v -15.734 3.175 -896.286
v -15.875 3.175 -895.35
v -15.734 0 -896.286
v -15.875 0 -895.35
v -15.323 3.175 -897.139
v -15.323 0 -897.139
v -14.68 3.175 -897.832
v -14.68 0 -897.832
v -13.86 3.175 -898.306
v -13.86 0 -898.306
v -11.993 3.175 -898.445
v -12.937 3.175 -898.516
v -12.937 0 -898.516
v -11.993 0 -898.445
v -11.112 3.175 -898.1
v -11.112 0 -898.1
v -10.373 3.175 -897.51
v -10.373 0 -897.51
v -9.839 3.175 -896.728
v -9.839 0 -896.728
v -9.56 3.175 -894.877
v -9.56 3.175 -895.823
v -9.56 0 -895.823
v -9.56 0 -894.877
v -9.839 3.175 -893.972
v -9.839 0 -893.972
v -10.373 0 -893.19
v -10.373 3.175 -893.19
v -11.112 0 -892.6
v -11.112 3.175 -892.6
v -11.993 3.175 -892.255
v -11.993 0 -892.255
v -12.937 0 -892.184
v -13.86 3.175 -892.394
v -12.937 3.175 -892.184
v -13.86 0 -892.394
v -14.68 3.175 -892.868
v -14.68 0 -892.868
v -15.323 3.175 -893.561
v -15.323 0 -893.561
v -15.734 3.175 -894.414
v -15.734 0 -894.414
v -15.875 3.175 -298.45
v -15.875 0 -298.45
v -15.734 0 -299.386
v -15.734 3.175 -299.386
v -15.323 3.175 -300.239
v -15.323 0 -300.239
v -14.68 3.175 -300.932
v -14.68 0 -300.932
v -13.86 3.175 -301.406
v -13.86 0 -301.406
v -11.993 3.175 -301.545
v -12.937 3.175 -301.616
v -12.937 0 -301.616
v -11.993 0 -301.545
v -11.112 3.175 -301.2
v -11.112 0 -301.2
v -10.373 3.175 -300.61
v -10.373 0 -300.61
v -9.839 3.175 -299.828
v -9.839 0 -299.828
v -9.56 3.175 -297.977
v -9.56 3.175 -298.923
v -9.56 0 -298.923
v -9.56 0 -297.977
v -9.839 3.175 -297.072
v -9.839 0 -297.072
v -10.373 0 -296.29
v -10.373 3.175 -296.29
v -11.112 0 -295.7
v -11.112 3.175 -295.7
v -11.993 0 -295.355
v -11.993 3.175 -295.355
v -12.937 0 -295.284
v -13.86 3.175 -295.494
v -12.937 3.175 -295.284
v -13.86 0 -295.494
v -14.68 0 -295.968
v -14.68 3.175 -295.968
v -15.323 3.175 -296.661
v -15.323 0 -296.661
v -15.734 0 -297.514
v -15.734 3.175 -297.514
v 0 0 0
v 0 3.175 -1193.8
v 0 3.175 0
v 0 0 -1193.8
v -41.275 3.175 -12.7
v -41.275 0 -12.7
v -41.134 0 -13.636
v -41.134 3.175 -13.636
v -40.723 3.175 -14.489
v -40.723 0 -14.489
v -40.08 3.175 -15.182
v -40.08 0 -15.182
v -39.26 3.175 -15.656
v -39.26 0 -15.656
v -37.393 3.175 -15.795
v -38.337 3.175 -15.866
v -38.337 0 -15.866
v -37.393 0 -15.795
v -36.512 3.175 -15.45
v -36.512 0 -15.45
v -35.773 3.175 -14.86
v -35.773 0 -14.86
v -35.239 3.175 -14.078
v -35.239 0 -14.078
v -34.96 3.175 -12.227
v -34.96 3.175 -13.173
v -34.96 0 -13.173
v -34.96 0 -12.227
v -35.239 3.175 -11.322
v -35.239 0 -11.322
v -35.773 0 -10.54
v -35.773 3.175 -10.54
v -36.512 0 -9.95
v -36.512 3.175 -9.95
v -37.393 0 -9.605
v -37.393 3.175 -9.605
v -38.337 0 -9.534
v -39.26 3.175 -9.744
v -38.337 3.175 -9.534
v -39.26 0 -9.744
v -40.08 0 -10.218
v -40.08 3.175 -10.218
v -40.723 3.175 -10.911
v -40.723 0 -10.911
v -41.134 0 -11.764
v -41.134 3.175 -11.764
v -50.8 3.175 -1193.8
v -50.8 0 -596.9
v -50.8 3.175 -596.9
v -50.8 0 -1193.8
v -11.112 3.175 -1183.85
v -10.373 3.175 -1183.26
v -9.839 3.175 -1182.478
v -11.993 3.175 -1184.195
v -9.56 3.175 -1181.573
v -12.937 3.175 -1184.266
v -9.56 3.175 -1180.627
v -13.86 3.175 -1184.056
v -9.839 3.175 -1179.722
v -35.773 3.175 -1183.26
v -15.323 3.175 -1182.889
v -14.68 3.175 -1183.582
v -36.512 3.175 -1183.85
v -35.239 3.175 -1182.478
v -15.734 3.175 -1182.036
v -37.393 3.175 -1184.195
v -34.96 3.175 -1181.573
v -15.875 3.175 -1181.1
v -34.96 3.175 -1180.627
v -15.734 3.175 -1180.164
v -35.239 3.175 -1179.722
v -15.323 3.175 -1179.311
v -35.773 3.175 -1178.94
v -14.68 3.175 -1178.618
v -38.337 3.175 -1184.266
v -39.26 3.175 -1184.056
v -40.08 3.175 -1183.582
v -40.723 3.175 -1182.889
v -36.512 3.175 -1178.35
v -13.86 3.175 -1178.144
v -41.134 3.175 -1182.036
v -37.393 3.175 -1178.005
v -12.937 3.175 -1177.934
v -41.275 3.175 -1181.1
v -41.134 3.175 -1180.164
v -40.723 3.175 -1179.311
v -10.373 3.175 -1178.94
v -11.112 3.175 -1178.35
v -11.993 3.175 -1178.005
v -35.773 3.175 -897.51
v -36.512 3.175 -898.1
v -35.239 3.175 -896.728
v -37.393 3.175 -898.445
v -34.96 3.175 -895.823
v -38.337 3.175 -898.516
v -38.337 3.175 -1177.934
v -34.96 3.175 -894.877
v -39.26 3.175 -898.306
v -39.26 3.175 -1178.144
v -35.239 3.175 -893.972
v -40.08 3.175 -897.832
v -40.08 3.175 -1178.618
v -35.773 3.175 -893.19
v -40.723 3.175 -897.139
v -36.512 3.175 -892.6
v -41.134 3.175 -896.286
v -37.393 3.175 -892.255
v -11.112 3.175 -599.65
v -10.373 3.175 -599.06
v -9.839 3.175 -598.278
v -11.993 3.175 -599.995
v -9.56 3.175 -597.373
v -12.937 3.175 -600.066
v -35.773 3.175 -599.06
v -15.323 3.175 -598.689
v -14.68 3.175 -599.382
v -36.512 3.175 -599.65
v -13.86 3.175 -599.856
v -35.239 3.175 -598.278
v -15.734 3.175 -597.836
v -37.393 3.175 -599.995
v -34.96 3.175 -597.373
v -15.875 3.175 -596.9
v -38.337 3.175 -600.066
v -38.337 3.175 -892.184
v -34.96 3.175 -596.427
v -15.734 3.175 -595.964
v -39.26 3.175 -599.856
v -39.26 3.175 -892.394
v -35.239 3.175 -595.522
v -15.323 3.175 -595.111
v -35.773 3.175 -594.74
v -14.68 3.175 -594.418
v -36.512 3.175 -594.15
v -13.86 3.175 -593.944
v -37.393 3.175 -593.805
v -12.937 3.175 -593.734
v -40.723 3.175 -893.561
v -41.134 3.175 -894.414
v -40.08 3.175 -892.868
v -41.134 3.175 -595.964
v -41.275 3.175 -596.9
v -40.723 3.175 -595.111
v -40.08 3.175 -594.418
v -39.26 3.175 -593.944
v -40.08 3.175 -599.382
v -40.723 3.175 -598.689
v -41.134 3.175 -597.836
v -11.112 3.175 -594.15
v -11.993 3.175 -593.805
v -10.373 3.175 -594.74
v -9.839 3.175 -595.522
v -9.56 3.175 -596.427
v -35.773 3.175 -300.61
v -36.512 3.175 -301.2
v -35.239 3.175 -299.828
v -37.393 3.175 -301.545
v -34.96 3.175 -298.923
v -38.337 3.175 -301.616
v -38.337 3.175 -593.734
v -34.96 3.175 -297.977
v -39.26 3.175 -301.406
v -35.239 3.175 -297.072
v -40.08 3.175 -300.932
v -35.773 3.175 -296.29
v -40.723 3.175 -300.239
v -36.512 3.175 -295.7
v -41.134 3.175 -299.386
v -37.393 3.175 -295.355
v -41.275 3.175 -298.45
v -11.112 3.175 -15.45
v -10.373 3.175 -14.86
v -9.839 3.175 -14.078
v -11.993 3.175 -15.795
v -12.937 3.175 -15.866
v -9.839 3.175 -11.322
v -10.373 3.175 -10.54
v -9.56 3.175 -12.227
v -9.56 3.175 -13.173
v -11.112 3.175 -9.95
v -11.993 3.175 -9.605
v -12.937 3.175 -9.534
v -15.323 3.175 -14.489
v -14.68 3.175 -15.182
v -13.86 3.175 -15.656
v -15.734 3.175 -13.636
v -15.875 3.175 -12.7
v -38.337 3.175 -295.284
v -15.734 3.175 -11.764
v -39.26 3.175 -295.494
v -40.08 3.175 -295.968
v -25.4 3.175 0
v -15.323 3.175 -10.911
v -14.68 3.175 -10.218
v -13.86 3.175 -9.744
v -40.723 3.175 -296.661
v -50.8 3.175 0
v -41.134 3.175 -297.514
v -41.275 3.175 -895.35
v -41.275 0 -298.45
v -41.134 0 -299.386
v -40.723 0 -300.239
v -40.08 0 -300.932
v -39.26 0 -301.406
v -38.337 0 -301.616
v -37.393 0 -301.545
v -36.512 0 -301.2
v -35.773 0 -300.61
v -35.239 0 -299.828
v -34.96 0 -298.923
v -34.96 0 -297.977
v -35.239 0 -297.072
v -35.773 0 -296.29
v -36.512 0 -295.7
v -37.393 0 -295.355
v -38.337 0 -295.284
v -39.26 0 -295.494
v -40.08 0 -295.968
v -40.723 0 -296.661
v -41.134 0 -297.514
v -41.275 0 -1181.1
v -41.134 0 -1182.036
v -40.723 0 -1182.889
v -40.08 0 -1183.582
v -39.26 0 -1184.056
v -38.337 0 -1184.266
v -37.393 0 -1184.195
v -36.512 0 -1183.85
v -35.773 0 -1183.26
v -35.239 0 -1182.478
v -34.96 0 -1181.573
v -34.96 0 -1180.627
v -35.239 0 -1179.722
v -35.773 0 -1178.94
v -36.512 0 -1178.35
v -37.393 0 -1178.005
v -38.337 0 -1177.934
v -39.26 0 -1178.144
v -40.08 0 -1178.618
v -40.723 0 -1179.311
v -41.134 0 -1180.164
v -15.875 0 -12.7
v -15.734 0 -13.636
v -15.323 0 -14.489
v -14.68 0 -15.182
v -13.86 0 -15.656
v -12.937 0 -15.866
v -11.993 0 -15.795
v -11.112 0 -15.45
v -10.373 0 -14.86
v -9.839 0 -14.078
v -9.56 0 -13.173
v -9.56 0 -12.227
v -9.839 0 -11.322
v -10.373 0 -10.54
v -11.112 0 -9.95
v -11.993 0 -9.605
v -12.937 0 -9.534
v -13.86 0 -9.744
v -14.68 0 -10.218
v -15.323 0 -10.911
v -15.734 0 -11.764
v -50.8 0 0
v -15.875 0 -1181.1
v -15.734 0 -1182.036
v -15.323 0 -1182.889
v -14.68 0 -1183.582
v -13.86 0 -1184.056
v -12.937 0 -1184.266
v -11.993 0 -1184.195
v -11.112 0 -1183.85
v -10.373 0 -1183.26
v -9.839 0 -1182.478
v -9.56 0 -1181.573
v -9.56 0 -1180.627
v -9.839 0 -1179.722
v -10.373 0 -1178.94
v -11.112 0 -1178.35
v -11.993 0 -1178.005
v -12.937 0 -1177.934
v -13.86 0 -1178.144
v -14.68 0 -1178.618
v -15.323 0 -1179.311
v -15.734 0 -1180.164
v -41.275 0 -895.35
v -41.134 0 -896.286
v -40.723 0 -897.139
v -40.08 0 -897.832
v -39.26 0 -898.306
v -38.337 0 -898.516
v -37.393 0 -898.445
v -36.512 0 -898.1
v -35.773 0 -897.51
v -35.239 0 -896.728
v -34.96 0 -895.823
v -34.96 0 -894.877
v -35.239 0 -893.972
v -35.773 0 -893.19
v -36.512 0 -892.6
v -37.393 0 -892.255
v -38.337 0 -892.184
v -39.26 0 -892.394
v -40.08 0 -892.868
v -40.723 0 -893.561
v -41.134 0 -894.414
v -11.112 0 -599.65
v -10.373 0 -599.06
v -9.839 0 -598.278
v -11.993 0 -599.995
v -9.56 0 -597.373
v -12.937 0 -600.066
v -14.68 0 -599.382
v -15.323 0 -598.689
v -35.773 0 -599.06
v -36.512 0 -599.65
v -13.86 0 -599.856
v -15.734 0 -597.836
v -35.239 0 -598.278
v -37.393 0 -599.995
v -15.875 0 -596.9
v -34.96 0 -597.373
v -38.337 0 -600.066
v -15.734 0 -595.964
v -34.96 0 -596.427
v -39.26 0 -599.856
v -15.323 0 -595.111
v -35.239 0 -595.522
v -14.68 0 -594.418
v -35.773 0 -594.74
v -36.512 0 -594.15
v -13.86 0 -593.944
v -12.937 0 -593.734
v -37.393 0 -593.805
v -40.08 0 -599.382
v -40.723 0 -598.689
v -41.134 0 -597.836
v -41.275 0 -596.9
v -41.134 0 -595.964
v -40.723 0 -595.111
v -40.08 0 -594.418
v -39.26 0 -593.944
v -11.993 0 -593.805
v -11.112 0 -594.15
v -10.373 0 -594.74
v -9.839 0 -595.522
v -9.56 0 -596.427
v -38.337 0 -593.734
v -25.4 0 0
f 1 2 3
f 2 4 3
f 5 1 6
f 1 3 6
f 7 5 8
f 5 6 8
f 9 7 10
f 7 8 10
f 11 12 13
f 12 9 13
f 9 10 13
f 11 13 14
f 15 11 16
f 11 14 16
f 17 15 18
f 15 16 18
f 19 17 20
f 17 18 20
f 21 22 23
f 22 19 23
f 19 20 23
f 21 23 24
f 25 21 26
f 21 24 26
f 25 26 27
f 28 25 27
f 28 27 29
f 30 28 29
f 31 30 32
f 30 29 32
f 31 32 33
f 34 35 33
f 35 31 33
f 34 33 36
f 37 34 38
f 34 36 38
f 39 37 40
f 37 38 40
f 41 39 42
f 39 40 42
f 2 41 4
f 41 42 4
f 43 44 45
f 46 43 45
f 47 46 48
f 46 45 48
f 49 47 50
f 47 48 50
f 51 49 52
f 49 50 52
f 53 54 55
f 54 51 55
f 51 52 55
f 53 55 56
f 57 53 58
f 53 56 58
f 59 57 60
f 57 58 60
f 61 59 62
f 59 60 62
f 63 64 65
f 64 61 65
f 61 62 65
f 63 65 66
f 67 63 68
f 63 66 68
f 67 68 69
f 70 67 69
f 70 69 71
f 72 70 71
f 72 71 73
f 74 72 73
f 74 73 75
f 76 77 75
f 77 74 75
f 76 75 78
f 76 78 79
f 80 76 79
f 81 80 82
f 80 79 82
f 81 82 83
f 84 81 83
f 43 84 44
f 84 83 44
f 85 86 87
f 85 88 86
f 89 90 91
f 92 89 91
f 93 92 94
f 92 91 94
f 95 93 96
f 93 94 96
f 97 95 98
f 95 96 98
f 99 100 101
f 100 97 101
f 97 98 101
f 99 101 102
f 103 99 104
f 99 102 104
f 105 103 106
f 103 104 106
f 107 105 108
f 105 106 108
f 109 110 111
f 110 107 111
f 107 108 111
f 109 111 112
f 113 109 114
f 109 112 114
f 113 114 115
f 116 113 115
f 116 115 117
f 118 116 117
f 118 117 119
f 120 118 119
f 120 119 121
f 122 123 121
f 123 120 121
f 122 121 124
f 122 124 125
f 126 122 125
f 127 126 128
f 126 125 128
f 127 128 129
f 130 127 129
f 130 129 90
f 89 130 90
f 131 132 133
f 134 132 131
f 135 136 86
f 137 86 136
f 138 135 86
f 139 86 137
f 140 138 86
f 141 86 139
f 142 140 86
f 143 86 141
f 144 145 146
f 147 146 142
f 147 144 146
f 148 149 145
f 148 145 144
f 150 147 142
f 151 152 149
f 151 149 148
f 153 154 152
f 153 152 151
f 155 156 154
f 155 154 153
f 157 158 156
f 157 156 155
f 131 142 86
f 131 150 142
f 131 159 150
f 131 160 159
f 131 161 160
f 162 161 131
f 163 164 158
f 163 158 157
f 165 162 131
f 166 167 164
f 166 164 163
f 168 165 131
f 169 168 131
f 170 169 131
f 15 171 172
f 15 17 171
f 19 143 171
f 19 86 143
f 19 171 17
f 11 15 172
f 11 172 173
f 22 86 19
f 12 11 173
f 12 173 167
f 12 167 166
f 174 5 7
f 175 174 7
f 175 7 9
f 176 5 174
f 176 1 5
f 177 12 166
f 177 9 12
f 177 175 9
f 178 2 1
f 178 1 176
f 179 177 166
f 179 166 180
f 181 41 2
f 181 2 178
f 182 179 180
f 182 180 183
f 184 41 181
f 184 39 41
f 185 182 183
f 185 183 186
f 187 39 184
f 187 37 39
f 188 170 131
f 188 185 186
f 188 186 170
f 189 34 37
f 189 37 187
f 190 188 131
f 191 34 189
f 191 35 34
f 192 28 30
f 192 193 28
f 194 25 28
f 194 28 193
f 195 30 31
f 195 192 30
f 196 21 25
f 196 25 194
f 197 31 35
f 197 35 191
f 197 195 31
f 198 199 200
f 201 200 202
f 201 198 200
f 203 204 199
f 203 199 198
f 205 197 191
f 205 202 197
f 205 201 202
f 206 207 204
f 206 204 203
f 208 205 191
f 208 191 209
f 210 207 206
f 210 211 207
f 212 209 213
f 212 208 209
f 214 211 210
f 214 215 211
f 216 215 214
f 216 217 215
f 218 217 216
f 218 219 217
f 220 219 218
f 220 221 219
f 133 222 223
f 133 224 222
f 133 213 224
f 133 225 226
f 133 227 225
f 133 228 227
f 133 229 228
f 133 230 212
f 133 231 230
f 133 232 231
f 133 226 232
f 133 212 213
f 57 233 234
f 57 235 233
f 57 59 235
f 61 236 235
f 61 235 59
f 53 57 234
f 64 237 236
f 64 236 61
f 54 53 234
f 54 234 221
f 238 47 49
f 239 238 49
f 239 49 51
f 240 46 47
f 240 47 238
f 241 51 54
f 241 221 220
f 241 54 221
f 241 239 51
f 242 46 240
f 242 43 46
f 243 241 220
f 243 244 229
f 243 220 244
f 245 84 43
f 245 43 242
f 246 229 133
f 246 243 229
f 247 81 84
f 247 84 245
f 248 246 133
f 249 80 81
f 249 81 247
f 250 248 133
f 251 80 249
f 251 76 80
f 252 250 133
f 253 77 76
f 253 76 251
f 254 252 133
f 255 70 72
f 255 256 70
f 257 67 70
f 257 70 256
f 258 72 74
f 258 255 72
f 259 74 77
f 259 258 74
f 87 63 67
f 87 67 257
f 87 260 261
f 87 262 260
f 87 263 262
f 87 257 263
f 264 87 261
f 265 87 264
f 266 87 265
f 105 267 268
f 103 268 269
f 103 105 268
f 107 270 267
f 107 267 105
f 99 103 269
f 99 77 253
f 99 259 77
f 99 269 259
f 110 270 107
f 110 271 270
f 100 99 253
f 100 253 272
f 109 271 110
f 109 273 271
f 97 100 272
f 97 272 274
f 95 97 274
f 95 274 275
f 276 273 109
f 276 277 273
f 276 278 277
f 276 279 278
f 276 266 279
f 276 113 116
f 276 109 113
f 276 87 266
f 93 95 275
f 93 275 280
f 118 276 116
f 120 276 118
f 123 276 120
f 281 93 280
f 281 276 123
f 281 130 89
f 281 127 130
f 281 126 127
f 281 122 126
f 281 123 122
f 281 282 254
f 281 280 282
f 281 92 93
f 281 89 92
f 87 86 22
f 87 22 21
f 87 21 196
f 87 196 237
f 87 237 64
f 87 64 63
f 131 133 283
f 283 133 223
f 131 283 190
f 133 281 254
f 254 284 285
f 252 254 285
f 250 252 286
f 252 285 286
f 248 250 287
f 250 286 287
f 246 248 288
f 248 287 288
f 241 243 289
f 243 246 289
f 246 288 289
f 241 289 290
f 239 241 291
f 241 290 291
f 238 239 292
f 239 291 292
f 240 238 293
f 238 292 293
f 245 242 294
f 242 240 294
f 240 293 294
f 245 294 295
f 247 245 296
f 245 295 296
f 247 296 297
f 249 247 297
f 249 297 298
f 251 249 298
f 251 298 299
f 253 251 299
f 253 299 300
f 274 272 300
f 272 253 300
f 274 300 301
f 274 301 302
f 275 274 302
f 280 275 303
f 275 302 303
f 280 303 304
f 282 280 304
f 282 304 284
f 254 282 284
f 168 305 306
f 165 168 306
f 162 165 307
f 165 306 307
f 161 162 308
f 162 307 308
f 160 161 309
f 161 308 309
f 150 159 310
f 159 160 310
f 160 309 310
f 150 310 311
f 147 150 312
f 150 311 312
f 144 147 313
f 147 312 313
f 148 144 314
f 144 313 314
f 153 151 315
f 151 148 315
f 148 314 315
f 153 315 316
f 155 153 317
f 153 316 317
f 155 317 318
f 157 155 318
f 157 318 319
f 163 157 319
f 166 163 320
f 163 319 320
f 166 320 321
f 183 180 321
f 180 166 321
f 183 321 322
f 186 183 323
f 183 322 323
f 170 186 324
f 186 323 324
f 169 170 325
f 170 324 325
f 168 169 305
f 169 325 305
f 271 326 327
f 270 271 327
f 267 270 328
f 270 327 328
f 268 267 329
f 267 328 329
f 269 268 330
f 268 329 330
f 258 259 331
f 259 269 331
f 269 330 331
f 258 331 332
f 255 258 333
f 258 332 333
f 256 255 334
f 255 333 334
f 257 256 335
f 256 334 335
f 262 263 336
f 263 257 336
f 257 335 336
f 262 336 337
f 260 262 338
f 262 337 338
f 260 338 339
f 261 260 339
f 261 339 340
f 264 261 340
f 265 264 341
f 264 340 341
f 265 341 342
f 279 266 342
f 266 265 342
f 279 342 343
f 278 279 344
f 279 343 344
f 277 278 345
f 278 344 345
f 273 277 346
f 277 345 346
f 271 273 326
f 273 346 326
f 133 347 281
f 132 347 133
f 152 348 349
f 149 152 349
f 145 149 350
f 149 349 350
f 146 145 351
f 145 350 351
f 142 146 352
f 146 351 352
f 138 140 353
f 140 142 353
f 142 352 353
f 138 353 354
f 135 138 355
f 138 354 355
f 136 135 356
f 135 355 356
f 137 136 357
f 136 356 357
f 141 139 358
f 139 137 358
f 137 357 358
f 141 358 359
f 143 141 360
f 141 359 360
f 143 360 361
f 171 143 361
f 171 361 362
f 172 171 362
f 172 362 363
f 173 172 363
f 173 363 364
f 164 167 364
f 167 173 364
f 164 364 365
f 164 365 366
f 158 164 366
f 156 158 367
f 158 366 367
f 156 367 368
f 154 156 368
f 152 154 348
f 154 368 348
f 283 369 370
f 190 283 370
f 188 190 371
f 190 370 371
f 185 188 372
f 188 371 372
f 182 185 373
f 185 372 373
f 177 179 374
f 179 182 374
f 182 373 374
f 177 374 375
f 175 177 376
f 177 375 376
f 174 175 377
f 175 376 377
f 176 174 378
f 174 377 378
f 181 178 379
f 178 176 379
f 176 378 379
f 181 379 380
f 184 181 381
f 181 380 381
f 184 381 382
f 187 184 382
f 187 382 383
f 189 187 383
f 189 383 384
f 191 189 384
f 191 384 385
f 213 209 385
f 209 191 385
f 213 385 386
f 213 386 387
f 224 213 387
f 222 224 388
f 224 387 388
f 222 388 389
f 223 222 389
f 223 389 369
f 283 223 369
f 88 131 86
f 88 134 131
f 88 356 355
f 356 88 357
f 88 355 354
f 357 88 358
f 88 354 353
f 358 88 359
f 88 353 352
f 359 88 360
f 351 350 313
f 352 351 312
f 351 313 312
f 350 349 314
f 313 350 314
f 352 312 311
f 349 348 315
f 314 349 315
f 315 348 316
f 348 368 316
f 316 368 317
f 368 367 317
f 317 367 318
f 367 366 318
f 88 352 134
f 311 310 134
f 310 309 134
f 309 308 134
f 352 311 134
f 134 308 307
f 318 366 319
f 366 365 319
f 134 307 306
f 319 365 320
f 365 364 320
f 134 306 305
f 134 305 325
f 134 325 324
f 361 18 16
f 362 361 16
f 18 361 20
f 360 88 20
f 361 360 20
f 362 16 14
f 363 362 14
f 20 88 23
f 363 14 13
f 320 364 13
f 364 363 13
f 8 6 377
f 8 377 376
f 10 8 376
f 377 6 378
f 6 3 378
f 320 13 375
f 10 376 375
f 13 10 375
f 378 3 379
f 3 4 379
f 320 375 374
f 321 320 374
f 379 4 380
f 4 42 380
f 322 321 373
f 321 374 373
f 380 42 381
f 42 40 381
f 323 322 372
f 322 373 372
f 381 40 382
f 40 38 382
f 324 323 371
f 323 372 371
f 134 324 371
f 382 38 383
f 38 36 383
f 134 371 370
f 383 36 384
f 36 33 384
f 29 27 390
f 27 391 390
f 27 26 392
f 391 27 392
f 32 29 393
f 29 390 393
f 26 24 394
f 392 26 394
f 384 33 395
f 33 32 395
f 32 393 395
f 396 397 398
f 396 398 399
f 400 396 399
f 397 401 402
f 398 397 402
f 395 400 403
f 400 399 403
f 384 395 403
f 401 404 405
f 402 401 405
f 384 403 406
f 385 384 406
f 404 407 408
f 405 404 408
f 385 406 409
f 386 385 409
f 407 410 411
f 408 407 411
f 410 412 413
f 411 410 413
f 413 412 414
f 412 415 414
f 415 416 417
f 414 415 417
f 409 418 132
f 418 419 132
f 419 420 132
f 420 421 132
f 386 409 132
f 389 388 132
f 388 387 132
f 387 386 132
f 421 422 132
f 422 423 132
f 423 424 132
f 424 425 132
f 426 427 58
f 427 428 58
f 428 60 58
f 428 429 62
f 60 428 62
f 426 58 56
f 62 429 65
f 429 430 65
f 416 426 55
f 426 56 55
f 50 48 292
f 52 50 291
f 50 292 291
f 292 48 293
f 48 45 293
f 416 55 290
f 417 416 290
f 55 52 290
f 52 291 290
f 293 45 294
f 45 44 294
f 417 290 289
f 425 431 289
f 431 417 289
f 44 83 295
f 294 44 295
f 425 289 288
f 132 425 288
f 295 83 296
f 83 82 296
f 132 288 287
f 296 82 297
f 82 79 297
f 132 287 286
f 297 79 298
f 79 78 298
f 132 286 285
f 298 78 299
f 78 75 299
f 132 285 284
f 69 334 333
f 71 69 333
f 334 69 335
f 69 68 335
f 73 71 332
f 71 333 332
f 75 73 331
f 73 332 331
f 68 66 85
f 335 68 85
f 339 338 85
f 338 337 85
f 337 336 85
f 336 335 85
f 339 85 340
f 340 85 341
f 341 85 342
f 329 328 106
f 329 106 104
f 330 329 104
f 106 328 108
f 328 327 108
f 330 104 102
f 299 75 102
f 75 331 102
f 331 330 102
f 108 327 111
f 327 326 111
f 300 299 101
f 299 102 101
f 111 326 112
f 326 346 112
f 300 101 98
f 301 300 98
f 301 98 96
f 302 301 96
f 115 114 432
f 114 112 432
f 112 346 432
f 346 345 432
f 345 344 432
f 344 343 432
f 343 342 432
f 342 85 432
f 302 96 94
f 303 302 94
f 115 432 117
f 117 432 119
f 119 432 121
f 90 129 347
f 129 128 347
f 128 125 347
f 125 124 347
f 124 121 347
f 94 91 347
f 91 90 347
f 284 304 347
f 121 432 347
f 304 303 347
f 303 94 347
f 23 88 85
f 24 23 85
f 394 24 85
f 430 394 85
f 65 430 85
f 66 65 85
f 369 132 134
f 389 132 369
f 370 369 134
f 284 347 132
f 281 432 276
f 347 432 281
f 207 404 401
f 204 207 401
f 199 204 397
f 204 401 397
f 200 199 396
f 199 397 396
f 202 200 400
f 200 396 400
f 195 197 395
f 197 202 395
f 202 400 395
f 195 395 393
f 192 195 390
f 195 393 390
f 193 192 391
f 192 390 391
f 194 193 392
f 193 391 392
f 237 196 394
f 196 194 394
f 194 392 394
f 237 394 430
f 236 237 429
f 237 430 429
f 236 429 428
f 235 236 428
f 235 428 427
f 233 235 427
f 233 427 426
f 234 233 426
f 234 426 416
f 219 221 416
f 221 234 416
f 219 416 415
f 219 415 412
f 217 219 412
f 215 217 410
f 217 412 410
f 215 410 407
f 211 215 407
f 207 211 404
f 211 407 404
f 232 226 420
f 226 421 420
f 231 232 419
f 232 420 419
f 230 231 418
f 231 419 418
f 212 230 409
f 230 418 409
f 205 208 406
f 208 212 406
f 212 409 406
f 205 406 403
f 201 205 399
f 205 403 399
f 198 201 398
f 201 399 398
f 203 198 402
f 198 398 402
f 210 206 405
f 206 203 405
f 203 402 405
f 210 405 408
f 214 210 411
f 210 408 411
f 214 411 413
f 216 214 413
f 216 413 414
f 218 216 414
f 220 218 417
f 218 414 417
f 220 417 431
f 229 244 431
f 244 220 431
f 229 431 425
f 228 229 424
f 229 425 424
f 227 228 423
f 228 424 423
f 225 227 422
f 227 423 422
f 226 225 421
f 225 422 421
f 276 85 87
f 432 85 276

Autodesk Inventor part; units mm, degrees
ref_plane "YZ Plane" through (0, 0, 0) normal (1, 0, 0) x (0, 1, 0)
ref_plane "XZ Plane" through (0, 0, 0) normal (0, 1, 0) x (-1, 0, 0)
ref_plane "XY Plane" through (0, 0, 0) normal (0, 0, 1) x (1, 0, 0)
sketch "Sketch1" plane through (0, 0, 0) normal (0, 1, 0) x (-1, 0, 0)
  line L0 (0, 0) -> (50.8, 0)
  line L1 (50.8, 0) -> (50.8, -1193.8)
  line L2 (50.8, -1193.8) -> (0, -1193.8)
  line L3 (0, -1193.8) -> (0, 0)
  circle A0 centre (38.1, -12.7) radius 3.175
  circle A1 centre (38.1, -298.45) radius 3.175
  circle A2 centre (38.1, -596.9) radius 3.175
  line L4 (50.8, -596.9) -> (48.4554, -596.9)
  line L5 (25.4, 0) -> (25.4, -12.7)
  circle A3 centre (38.1, -1181.1) radius 3.175
  circle A4 centre (38.1, -895.35) radius 3.175
  circle A5 centre (12.7, -298.45) radius 3.175
  circle A6 centre (12.7, -596.9) radius 3.175
  circle A7 centre (12.7, -1181.1) radius 3.175
  circle A8 centre (12.7, -895.35) radius 3.175
  circle A9 centre (12.7, -12.7) radius 3.175
  dimension "d0" = 50.8
  dimension "d1" = 1193.8
  dimension "d4" = 6.35
  dimension "d5" = 12.7
  dimension "d6" = 12.7
  dimension "d7" = 6.35
  dimension "d8" = 298.45
  dimension "d9" = 6.35
  dimension "d10" = 596.9
  dimension "d11" = 6.35
extrude "Extrusion1" add sketch "Sketch1" along normal blind 3.175
properties part number "Plate2inx47in"
